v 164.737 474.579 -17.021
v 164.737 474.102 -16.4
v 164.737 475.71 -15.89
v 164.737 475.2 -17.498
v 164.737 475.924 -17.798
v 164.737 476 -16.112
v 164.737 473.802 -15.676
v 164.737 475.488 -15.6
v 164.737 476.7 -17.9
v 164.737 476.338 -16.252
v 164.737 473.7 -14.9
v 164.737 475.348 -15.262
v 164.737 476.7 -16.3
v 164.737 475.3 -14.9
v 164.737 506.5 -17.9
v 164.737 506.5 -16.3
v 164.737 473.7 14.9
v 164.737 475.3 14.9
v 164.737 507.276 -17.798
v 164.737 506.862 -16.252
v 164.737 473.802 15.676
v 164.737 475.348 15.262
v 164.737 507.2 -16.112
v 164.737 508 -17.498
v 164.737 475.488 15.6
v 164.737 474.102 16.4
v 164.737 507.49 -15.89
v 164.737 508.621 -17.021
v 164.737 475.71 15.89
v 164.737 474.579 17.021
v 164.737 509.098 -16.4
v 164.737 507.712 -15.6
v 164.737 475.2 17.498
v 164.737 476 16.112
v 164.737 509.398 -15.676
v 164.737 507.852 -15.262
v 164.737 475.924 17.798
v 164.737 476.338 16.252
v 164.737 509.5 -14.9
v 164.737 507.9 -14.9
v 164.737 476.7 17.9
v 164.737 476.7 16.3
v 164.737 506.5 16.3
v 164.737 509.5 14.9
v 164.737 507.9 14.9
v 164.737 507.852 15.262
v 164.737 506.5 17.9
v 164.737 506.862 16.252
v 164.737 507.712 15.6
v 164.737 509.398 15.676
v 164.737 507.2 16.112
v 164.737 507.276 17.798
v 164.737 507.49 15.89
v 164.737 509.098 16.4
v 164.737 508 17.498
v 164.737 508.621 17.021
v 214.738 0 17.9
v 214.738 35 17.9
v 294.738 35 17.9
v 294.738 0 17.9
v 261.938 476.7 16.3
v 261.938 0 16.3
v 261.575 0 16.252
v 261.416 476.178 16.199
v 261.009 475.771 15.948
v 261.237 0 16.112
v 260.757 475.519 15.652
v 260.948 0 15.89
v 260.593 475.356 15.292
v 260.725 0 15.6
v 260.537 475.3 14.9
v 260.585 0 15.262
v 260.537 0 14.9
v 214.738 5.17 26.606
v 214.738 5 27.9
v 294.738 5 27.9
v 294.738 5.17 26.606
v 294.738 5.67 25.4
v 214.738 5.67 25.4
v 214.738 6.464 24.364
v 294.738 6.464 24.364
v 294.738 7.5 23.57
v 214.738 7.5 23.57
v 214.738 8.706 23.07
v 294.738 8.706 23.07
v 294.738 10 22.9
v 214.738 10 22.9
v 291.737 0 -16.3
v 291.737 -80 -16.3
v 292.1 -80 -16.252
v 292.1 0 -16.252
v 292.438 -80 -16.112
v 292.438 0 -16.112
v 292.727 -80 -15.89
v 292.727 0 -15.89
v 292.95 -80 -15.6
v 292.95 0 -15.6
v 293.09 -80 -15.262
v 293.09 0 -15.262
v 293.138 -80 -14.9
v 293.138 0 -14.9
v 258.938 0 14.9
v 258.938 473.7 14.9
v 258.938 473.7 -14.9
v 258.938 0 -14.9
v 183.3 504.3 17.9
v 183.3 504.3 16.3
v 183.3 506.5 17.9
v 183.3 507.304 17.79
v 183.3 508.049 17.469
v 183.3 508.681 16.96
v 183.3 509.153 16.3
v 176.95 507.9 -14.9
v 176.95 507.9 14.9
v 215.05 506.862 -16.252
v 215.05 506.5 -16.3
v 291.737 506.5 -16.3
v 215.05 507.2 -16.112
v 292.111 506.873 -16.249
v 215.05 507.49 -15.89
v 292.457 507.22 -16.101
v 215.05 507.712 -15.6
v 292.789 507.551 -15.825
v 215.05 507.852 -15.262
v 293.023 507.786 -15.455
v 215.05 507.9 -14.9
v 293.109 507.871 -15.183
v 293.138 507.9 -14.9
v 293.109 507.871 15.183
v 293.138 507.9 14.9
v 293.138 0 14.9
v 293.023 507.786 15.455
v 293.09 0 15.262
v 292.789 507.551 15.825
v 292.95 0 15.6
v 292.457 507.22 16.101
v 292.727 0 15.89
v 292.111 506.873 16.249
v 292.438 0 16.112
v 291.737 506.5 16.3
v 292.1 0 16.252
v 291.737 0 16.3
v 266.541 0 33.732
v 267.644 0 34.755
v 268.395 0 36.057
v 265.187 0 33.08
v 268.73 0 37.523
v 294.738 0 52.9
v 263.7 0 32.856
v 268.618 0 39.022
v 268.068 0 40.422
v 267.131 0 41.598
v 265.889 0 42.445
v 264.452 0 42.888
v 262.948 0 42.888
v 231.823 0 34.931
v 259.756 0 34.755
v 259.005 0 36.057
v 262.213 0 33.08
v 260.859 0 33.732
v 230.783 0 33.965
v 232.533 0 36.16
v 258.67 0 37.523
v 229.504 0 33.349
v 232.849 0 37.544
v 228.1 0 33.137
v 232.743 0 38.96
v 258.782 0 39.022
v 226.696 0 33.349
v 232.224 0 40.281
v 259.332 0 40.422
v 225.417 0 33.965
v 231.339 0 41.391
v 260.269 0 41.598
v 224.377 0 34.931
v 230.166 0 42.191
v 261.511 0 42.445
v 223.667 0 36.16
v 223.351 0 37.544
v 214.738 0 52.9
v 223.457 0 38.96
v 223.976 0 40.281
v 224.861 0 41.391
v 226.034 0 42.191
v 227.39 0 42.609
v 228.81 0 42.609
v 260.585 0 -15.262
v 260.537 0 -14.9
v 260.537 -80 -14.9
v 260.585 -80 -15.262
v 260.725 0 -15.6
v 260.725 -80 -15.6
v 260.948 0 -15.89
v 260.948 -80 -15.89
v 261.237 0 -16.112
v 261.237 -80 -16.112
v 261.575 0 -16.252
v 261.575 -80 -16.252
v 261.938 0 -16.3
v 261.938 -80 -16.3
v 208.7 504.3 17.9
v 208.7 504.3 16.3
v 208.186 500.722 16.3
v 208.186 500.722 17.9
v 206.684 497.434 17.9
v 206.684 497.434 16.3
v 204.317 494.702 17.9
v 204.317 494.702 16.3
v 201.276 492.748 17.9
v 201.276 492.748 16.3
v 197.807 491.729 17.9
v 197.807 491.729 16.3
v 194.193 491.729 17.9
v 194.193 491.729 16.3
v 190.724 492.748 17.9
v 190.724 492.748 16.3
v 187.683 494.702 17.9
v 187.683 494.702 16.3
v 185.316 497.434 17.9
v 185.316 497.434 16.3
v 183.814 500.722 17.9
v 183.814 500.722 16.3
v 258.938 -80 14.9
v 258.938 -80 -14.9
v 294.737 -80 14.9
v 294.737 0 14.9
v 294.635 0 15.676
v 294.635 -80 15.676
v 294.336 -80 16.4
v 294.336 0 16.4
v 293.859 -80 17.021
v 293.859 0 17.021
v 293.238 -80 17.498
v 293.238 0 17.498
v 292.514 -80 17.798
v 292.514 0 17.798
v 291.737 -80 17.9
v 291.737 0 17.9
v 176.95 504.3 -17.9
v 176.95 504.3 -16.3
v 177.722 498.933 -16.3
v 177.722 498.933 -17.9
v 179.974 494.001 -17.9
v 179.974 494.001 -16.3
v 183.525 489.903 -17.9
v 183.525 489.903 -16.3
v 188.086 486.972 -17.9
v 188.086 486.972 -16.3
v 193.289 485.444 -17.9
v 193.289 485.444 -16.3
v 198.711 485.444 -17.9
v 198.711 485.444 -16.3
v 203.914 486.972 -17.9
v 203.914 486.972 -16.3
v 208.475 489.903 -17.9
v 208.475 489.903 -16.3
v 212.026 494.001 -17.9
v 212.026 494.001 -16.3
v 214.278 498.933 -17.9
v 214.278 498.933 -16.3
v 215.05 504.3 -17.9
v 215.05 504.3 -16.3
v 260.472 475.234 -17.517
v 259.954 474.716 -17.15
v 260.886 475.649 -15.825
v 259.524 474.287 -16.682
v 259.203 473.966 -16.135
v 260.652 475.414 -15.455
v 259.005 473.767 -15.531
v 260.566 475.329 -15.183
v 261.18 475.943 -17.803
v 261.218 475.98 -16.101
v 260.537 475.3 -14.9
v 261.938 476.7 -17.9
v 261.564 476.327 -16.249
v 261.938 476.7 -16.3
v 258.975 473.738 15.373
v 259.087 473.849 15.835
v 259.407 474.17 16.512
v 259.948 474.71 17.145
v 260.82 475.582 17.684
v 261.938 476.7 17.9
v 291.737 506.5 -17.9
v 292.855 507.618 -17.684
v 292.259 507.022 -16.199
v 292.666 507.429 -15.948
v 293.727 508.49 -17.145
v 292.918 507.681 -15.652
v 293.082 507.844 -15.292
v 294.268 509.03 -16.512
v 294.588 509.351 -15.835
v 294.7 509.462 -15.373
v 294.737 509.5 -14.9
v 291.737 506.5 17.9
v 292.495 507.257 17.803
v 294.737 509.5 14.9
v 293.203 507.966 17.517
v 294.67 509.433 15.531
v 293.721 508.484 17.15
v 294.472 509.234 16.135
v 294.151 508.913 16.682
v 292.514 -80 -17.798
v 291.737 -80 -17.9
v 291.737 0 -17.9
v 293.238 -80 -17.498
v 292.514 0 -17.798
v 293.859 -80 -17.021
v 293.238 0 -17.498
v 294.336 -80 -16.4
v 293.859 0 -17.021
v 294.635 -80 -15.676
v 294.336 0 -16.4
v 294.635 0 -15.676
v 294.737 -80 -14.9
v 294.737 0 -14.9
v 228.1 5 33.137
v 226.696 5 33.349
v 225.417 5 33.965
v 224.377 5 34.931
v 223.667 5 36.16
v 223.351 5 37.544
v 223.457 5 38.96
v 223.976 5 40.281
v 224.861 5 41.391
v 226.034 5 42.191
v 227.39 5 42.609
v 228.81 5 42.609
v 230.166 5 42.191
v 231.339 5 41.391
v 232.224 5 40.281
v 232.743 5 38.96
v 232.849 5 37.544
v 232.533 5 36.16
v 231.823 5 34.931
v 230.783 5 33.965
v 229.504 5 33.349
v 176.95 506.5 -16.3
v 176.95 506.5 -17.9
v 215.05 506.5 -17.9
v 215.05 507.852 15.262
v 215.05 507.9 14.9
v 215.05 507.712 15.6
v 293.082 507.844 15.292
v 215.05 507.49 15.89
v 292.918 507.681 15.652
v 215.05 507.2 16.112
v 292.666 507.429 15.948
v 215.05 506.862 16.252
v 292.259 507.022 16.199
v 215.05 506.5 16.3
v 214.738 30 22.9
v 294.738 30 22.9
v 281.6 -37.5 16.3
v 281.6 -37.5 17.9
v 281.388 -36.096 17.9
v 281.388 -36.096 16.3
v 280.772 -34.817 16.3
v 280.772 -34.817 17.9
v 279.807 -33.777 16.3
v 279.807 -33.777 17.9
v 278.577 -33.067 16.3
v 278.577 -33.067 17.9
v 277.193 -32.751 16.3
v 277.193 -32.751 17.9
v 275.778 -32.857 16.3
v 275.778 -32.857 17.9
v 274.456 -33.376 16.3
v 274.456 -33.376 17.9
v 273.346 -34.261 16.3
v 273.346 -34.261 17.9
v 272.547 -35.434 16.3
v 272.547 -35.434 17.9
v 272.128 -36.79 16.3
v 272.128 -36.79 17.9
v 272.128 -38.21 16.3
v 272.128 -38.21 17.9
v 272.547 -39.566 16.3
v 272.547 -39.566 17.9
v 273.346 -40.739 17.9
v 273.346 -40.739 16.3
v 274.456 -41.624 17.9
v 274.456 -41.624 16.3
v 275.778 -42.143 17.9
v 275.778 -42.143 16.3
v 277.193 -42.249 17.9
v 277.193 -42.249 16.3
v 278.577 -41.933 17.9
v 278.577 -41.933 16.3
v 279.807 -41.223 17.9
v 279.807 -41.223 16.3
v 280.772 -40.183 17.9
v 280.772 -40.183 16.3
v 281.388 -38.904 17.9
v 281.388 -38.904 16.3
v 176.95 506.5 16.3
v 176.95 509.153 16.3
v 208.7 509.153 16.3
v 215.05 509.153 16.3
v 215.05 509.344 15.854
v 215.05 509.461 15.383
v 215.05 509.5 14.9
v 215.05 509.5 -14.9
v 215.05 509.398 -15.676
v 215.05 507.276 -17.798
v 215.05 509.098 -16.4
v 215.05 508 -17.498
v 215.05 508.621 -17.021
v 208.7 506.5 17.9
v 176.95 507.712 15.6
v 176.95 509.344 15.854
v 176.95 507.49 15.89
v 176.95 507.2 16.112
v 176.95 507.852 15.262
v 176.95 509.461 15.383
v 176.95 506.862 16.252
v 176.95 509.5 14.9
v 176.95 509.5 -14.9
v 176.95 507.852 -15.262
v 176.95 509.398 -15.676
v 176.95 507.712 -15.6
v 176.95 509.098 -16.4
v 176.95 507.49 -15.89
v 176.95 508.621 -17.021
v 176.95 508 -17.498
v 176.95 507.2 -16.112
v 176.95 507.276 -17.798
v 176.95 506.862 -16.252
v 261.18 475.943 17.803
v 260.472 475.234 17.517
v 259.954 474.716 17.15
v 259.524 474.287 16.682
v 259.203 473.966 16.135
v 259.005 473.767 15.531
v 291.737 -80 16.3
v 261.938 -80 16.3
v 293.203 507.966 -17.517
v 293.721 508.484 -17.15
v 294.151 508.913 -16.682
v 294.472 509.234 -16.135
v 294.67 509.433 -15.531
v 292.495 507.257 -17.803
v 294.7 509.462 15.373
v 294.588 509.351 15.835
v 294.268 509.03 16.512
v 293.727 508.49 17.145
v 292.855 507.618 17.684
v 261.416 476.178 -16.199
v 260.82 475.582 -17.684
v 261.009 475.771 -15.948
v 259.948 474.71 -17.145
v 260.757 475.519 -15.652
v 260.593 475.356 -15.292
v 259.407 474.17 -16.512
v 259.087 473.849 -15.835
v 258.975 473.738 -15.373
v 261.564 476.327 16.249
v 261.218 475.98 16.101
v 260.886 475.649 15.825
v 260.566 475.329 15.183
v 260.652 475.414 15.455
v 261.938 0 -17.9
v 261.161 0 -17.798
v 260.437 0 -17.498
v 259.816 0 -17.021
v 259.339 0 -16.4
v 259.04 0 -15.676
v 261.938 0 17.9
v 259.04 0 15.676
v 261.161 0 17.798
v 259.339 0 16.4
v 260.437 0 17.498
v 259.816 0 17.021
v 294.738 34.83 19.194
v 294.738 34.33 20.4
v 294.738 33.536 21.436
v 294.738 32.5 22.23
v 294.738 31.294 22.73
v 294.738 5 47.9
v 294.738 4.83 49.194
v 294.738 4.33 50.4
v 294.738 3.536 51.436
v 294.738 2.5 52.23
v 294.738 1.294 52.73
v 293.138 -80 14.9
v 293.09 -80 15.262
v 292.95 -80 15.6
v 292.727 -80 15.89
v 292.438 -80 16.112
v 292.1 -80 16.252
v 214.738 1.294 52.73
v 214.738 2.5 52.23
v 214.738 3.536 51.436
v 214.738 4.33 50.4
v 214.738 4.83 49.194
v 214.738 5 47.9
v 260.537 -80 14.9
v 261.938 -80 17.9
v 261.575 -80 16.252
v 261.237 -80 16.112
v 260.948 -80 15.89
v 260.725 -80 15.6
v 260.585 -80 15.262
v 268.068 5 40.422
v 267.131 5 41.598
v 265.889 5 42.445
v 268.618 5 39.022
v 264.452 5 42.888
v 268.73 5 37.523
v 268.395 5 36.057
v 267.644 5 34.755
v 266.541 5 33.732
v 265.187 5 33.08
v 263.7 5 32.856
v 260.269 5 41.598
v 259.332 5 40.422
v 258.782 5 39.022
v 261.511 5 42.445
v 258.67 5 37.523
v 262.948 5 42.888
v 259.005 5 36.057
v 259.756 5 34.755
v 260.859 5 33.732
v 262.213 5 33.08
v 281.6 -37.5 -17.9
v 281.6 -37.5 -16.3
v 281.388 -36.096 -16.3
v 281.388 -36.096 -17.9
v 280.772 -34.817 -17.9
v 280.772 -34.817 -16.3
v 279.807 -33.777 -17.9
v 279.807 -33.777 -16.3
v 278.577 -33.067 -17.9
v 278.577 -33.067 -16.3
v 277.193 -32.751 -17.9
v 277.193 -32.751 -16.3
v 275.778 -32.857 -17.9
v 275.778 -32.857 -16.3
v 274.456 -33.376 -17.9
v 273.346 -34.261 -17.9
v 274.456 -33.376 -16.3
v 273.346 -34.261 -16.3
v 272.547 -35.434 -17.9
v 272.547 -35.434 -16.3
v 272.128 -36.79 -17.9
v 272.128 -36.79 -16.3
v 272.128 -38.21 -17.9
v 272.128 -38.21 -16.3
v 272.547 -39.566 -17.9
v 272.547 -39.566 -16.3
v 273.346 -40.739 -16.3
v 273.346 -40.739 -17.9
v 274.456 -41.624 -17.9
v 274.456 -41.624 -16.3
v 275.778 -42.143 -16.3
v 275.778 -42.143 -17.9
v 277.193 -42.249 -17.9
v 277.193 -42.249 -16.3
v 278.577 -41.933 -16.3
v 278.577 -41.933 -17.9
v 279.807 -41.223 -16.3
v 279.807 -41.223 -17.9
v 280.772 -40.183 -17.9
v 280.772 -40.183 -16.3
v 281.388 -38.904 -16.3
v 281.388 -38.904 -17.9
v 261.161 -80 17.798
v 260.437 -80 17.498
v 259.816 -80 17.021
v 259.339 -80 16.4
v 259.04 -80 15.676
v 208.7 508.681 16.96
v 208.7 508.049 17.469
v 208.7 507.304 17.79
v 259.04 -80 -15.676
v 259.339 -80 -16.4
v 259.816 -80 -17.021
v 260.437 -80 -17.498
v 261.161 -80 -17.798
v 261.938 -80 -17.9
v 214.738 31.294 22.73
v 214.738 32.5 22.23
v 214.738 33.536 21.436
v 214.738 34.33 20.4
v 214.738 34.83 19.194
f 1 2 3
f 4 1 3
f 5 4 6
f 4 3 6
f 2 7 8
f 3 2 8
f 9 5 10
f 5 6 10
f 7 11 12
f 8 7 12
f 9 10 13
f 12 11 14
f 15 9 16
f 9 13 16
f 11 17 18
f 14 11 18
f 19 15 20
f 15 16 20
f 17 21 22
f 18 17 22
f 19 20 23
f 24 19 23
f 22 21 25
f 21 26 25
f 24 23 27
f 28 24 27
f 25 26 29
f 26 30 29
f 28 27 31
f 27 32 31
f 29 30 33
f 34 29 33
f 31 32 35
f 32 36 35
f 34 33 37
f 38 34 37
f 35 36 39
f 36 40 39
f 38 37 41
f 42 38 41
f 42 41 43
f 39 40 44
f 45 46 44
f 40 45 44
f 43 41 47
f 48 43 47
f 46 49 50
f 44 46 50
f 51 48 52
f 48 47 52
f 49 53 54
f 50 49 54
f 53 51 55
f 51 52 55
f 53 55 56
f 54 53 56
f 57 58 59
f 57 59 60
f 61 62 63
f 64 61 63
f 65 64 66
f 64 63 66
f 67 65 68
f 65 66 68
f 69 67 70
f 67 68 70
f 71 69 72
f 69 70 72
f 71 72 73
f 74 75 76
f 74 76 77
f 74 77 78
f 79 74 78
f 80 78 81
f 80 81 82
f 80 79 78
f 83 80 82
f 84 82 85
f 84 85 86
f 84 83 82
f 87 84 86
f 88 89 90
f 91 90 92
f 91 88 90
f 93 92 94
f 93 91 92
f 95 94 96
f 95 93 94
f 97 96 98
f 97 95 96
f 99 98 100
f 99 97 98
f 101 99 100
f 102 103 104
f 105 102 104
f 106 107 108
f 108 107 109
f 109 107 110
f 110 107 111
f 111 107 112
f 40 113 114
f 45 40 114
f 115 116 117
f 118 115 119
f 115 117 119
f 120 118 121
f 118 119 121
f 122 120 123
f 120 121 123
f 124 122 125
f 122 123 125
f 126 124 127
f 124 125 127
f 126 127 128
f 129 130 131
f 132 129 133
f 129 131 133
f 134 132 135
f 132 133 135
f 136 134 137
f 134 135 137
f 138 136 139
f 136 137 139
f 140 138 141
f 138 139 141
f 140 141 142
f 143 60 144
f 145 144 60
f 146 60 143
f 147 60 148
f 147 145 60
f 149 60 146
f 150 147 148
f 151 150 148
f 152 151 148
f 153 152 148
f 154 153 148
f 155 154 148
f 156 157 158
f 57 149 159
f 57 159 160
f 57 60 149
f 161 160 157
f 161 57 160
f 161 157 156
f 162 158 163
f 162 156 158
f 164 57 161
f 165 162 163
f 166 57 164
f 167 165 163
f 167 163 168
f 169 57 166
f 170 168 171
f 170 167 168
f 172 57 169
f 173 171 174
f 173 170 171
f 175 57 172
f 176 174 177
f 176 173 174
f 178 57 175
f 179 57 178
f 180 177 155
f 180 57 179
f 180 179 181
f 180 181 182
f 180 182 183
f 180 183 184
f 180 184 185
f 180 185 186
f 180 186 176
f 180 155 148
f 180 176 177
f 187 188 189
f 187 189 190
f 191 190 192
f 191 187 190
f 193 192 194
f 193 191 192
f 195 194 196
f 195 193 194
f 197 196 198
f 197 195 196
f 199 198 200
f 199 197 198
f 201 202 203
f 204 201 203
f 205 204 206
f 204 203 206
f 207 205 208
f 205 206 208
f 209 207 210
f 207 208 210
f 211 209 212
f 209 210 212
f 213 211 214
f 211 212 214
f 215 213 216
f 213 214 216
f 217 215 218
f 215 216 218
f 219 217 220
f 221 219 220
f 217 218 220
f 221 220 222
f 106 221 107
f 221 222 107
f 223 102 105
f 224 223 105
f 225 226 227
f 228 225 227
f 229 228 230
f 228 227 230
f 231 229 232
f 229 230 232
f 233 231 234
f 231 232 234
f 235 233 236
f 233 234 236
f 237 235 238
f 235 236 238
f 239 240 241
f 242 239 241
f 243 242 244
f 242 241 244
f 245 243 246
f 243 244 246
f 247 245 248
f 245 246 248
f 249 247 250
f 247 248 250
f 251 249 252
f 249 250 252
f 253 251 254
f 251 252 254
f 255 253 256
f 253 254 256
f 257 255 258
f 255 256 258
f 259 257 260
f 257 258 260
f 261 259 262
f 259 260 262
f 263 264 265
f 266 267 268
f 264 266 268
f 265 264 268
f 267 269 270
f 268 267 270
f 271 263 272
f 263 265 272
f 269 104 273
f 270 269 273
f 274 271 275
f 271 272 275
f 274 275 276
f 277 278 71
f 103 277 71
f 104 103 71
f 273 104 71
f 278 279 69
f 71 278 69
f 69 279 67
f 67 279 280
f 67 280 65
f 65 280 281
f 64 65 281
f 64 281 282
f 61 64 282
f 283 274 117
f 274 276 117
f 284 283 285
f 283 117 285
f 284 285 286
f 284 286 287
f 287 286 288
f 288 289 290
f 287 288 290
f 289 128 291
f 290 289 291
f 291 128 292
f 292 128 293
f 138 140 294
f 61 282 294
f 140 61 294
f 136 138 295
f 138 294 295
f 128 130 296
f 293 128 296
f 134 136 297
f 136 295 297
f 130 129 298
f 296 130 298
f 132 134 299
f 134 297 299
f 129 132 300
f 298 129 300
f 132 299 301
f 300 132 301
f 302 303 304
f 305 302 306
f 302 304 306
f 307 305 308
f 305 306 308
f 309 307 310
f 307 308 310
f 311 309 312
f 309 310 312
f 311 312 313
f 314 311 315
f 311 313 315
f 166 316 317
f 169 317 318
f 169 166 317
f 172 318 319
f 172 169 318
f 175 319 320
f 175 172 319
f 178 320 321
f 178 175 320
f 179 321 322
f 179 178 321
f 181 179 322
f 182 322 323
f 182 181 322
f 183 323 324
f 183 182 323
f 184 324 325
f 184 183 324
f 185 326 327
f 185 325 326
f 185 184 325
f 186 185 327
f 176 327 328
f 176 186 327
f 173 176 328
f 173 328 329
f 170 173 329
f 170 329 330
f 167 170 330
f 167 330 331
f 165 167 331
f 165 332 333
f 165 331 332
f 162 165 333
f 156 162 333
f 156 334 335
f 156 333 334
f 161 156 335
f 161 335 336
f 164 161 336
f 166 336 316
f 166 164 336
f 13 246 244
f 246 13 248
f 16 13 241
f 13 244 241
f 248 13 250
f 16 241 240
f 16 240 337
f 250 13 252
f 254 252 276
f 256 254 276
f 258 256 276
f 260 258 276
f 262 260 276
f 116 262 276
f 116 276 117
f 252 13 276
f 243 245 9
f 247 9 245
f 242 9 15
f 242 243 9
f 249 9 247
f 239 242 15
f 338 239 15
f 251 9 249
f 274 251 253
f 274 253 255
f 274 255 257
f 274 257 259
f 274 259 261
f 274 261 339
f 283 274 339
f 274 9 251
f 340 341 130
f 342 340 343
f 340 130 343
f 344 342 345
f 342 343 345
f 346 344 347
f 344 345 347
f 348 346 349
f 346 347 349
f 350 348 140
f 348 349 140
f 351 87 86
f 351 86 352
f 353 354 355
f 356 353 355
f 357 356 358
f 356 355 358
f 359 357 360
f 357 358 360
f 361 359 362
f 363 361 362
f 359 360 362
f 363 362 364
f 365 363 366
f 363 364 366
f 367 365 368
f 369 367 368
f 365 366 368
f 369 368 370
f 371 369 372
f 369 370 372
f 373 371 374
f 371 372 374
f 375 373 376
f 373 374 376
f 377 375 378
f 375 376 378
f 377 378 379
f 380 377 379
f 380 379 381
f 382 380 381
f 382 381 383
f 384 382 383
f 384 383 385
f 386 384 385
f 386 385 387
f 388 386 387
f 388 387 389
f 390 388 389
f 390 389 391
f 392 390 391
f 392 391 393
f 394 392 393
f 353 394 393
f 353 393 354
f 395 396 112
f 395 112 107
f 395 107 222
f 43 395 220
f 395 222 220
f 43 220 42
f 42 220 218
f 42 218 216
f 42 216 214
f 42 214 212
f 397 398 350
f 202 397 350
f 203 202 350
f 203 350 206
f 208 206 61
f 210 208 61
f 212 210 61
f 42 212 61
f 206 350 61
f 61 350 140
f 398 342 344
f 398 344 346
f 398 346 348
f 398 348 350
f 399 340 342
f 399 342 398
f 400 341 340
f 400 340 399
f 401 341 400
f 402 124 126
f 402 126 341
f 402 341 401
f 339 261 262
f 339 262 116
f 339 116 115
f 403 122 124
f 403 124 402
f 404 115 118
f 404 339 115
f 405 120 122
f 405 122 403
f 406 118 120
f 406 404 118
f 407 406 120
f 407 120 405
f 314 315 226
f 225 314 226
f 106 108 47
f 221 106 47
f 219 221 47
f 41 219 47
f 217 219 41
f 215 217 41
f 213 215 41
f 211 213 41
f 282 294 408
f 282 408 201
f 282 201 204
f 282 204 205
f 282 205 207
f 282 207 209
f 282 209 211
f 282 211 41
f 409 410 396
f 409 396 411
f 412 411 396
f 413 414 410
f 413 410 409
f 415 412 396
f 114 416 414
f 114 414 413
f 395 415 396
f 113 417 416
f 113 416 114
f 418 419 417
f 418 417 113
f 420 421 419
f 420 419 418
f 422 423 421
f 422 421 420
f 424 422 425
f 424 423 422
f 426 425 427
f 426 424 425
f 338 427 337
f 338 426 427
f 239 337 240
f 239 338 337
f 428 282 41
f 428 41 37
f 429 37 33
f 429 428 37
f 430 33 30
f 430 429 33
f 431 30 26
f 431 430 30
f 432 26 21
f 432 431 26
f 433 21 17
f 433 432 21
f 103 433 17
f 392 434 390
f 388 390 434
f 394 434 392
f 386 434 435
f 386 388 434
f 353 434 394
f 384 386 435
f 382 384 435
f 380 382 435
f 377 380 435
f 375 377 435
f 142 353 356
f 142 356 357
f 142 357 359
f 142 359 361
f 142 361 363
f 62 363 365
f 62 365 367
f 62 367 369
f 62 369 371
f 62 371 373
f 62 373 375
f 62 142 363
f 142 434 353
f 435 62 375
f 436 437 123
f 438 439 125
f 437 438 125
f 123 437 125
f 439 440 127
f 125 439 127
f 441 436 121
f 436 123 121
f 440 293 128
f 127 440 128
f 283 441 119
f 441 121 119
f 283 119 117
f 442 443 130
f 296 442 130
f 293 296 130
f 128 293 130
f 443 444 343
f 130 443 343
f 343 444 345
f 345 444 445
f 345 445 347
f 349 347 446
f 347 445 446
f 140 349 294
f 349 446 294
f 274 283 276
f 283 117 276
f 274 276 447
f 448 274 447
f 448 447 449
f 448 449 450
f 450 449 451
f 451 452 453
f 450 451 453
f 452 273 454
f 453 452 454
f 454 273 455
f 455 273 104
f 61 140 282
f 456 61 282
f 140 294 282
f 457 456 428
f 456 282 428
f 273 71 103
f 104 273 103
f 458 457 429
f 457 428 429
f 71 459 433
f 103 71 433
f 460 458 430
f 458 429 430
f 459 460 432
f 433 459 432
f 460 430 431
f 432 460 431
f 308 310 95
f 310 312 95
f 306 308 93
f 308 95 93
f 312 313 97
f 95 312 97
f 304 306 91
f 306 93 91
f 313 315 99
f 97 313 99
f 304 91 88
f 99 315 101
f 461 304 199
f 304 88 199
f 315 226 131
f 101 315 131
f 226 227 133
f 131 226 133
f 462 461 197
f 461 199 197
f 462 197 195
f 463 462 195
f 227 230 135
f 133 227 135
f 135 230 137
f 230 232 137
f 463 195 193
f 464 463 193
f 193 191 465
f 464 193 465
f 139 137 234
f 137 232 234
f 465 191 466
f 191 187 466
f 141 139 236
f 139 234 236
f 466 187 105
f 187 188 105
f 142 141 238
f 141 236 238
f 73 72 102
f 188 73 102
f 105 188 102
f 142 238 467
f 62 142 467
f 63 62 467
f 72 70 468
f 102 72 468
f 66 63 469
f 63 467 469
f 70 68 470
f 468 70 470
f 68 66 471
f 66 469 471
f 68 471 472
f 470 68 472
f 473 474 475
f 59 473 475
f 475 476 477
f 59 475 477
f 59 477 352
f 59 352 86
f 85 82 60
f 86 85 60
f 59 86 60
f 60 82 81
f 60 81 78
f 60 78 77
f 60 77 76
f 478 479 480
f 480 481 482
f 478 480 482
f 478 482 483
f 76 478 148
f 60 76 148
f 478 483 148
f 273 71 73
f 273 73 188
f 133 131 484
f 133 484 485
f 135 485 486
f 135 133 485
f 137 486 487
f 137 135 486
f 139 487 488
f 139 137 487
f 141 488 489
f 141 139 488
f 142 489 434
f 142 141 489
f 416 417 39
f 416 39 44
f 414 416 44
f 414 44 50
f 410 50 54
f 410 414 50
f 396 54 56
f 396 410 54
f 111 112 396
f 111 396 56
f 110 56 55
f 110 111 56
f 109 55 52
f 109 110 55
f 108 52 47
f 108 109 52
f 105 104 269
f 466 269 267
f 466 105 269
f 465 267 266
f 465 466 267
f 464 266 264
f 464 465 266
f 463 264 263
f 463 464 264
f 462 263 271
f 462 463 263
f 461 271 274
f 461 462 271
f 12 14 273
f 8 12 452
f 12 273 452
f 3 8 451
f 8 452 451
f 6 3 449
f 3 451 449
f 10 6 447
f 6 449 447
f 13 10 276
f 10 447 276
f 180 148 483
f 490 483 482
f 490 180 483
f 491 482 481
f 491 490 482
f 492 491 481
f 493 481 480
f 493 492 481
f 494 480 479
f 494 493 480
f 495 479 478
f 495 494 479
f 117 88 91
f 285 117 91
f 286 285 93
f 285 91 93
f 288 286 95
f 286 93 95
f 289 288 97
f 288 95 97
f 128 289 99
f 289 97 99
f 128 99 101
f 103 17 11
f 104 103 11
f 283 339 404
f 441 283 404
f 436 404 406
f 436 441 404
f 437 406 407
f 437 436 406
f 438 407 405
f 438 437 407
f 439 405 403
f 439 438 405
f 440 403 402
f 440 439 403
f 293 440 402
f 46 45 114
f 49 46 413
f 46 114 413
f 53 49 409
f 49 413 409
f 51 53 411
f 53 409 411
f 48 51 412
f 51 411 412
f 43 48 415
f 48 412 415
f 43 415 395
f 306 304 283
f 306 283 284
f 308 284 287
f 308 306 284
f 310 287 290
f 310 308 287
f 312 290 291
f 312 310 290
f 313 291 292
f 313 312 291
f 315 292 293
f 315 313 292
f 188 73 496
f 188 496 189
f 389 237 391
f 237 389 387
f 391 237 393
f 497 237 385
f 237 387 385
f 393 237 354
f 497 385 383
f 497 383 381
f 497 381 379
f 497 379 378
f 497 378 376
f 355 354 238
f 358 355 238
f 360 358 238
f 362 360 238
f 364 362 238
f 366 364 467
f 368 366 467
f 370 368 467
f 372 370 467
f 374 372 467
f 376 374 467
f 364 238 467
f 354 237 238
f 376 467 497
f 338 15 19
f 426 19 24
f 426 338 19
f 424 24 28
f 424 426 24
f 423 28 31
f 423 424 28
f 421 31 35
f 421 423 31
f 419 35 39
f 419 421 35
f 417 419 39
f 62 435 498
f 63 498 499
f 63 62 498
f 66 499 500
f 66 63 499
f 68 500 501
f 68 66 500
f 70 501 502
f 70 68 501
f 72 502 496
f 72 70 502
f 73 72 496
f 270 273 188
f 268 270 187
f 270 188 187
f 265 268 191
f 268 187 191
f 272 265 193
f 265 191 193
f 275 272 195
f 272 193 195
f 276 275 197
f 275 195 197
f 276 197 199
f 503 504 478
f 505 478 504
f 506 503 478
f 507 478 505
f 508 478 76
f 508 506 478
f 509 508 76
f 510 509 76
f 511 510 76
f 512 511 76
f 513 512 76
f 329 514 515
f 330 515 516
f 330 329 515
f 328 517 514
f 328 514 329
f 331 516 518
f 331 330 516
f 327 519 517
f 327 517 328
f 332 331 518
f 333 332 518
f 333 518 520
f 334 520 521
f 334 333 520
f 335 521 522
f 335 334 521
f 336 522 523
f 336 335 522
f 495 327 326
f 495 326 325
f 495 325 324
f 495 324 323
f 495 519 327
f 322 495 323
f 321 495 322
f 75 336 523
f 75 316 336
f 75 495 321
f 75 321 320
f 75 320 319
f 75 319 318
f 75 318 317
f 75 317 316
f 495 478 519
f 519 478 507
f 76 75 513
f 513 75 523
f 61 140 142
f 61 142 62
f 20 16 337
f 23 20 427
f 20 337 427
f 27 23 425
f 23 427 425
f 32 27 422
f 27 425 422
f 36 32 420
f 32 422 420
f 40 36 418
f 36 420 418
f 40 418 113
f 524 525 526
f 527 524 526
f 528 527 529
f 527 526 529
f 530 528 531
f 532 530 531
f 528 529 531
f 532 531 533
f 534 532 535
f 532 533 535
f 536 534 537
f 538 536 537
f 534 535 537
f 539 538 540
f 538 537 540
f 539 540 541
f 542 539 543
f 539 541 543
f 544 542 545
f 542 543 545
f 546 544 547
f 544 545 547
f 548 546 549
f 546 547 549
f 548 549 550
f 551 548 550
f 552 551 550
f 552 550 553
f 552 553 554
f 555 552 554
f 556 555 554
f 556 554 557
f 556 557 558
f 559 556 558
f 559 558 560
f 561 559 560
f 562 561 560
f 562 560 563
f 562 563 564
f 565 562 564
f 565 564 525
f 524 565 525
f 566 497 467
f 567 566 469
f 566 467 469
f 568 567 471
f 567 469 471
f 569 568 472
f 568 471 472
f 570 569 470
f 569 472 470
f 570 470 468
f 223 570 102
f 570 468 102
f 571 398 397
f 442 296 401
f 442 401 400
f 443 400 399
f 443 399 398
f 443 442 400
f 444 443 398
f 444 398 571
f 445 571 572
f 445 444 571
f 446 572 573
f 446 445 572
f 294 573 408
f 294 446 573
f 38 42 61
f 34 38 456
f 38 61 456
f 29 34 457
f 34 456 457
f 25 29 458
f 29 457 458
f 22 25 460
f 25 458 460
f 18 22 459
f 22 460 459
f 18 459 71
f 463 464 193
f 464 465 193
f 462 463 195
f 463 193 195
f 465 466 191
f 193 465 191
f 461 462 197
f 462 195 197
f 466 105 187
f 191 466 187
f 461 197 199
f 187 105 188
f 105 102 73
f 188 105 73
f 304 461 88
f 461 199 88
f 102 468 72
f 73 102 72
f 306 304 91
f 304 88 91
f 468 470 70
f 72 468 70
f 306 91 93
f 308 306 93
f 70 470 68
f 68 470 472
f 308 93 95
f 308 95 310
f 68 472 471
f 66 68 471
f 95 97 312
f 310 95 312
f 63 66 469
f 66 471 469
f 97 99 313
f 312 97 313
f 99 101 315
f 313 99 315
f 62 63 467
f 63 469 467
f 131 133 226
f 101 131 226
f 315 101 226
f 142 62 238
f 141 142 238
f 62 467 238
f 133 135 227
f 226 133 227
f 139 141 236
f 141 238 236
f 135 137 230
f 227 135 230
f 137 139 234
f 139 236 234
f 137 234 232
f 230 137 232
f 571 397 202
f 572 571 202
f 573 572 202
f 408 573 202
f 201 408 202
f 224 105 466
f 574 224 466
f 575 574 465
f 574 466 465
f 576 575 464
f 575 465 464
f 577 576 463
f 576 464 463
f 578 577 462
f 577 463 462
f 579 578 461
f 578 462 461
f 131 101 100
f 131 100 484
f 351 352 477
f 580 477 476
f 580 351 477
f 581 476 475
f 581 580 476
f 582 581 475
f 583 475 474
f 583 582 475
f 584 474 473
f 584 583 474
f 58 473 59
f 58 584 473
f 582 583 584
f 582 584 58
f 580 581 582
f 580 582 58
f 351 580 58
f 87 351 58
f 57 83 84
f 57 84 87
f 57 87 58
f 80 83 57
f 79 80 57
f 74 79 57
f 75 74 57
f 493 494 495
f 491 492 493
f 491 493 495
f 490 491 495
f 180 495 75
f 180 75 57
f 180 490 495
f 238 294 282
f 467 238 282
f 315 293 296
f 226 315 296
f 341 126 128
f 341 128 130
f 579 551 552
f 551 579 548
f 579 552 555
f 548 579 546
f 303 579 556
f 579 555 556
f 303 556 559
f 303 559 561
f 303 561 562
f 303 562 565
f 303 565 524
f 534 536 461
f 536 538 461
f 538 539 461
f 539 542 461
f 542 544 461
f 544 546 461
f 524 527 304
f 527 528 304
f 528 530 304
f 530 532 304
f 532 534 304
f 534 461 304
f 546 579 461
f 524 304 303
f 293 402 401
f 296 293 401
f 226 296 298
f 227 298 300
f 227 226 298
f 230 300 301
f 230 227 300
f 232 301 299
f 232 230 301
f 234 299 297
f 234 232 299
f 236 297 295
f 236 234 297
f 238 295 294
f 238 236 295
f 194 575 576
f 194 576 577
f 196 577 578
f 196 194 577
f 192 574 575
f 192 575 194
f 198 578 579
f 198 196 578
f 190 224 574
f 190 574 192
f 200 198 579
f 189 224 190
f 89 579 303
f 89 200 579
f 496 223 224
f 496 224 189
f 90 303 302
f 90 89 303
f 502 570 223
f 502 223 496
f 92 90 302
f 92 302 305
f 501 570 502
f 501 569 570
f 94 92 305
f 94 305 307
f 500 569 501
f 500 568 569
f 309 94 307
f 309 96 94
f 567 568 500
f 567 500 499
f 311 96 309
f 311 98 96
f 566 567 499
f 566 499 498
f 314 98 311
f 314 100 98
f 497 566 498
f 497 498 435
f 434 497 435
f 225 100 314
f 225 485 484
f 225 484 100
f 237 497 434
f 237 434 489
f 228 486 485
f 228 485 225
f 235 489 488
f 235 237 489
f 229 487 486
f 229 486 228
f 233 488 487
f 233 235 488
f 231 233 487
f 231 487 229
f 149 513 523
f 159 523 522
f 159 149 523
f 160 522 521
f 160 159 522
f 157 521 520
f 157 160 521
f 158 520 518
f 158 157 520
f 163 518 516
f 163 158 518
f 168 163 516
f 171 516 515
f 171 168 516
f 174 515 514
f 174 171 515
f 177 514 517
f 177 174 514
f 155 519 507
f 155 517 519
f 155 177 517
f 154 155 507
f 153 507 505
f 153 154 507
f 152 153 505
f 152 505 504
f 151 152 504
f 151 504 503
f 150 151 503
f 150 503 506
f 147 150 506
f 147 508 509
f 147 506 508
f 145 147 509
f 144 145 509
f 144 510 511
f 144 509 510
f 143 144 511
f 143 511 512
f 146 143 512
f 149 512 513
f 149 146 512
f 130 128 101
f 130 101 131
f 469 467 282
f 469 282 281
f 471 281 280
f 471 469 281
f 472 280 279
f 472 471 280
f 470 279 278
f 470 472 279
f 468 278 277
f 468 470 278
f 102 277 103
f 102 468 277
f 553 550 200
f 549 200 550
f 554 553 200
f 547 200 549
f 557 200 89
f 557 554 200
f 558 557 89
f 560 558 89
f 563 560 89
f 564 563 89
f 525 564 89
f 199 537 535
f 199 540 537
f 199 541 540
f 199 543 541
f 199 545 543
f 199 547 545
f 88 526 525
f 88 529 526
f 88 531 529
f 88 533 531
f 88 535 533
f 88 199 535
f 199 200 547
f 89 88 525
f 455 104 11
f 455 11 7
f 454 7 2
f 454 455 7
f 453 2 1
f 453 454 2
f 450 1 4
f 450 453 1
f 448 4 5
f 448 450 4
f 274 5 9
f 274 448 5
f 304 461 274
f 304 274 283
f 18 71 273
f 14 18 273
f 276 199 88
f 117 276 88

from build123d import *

# Parameters (mm, degrees)
STRUCTURAL_MEMBERMAIN_DEPTH                   = 1
STRUCTURAL_MEMBERMAIN_DEPTH_BACK              = 80
STRUCTURAL_MEMBERMAIN_2_DEPTH                 = 518.914422766
STRUCTURAL_MEMBERMAIN_3_DEPTH                 = 138.414422766
CUT_EXTRUDETOPRAILGUIDE_DEPTH                 = 589.881018463
CUT_EXTRUDETOPRAILGUIDE_DEPTH_BACK            = 589.881018463
STRUCTURAL_MEMBERANGLE_DEPTH                  = 80
SKETCH15_R                                    = 4.7625
SKETCH15_R_2                                  = 5.044092484
CUT_EXTRUDEMOUNTINGHOLES_DEPTH                = 591.981263583
CUT_EXTRUDEENLARGERAILGUIDE_DEPTH             = 591.981263583
CUT_EXTRUDEENLARGERAILGUIDE_DIRECTION_2_REACH = 592.981
SKETCH17_R                                    = 4.7625
CUT_EXTRUDE1_DEPTH                            = 590.696603268


with BuildPart() as part:
    # Sketch11 → Structural MemberMain (new, two sides)
    with BuildSketch(Plane(origin=(276.8375, 0, 0), x_dir=(-1, 0, 0), z_dir=(0, 1, 0))) as structural_membermain_sk:
        with BuildLine():
            Line((-14.9, 17.9), (14.9, 17.9))
            ThreePointArc((14.9, 17.9), (17.021320344, 17.021320344), (17.9, 14.9))
            Line((17.9, 14.9), (17.9, -14.9))
            ThreePointArc((17.9, -14.9), (17.021320344, -17.021320344), (14.9, -17.9))
            Line((14.9, -17.9), (-14.9, -17.9))
            ThreePointArc((-14.9, -17.9), (-17.021320344, -17.021320344), (-17.9, -14.9))
            Line((-17.9, -14.9), (-17.9, 14.9))
            ThreePointArc((-17.9, 14.9), (-17.021320344, 17.021320344), (-14.9, 17.9))
        make_face()
        with BuildLine():
            Line((-14.9, 16.3), (14.9, 16.3))
            ThreePointArc((14.9, 16.3), (15.889949494, 15.889949494), (16.3, 14.9))
            Line((16.3, 14.9), (16.3, -14.9))
            ThreePointArc((16.3, -14.9), (15.889949494, -15.889949494), (14.9, -16.3))
            Line((14.9, -16.3), (-14.9, -16.3))
            ThreePointArc((-14.9, -16.3), (-15.889949494, -15.889949494), (-16.3, -14.9))
            Line((-16.3, -14.9), (-16.3, 14.9))
            ThreePointArc((-16.3, 14.9), (-15.889949494, 15.889949494), (-14.9, 16.3))
        make_face(mode=Mode.SUBTRACT)
    extrude(amount=STRUCTURAL_MEMBERMAIN_DEPTH)
    extrude(structural_membermain_sk.sketch, amount=-STRUCTURAL_MEMBERMAIN_DEPTH_BACK)

    # Structural MemberMain mitre 1
    split(bisect_by=Plane(origin=(276.8375, 0, 0), x_dir=(1, 0, 0), z_dir=(0, -1, 0)), keep=Keep.TOP)

    # Sketch17 → Cut-Extrude1 (cut, through all)
    with BuildSketch(Plane.XY.offset(17.9)):
        with Locations((276.8375, -37.5)):
            Circle(SKETCH17_R)
    extrude(amount=-CUT_EXTRUDE1_DEPTH, mode=Mode.SUBTRACT)


with BuildPart() as body_2:
    # Sketch11 on segment 2 (carried to segment 2) → Structural MemberMain 2 (new body)
    with BuildSketch(Plane(origin=(276.8375, -1, 0), x_dir=(-1, 0, 0), z_dir=(0, 1, 0))):
        with BuildLine():
            Line((-14.9, 17.9), (14.9, 17.9))
            ThreePointArc((14.9, 17.9), (17.021320344, 17.021320344), (17.9, 14.9))
            Line((17.9, 14.9), (17.9, -14.9))
            ThreePointArc((17.9, -14.9), (17.021320344, -17.021320344), (14.9, -17.9))
            Line((14.9, -17.9), (-14.9, -17.9))
            ThreePointArc((-14.9, -17.9), (-17.021320344, -17.021320344), (-17.9, -14.9))
            Line((-17.9, -14.9), (-17.9, 14.9))
            ThreePointArc((-17.9, 14.9), (-17.021320344, 17.021320344), (-14.9, 17.9))
        make_face()
        with BuildLine():
            Line((-14.9, 16.3), (14.9, 16.3))
            ThreePointArc((14.9, 16.3), (15.889949494, 15.889949494), (16.3, 14.9))
            Line((16.3, 14.9), (16.3, -14.9))
            ThreePointArc((16.3, -14.9), (15.889949494, -15.889949494), (14.9, -16.3))
            Line((14.9, -16.3), (-14.9, -16.3))
            ThreePointArc((-14.9, -16.3), (-15.889949494, -15.889949494), (-16.3, -14.9))
            Line((-16.3, -14.9), (-16.3, 14.9))
            ThreePointArc((-16.3, 14.9), (-15.889949494, 15.889949494), (-14.9, 16.3))
        make_face(mode=Mode.SUBTRACT)
    extrude(amount=STRUCTURAL_MEMBERMAIN_2_DEPTH)

    # Structural MemberMain 2 mitre 1
    split(bisect_by=Plane(origin=(276.8375, 0, 0), x_dir=(-1, 0, 0), z_dir=(0, 1, 0)), keep=Keep.TOP)

    # Structural MemberMain 2 mitre 2
    split(bisect_by=Plane(origin=(276.8375, 491.6, 0), x_dir=(0.707106781, 0.707106781, 0), z_dir=(0.707106781, -0.707106781, 0)), keep=Keep.TOP)


with BuildPart() as body_3:
    # Sketch11 on segment 3 (carried to segment 3) → Structural MemberMain 3 (new body)
    with BuildSketch(Plane(origin=(303.151922766, 491.6, 0), x_dir=(0, -1, 0), z_dir=(-1, 0, 0))):
        with BuildLine():
            Line((-14.9, 17.9), (14.9, 17.9))
            ThreePointArc((14.9, 17.9), (17.021320344, 17.021320344), (17.9, 14.9))
            Line((17.9, 14.9), (17.9, -14.9))
            ThreePointArc((17.9, -14.9), (17.021320344, -17.021320344), (14.9, -17.9))
            Line((14.9, -17.9), (-14.9, -17.9))
            ThreePointArc((-14.9, -17.9), (-17.021320344, -17.021320344), (-17.9, -14.9))
            Line((-17.9, -14.9), (-17.9, 14.9))
            ThreePointArc((-17.9, 14.9), (-17.021320344, 17.021320344), (-14.9, 17.9))
        make_face()
        with BuildLine():
            Line((-14.9, 16.3), (14.9, 16.3))
            ThreePointArc((14.9, 16.3), (15.889949494, 15.889949494), (16.3, 14.9))
            Line((16.3, 14.9), (16.3, -14.9))
            ThreePointArc((16.3, -14.9), (15.889949494, -15.889949494), (14.9, -16.3))
            Line((14.9, -16.3), (-14.9, -16.3))
            ThreePointArc((-14.9, -16.3), (-15.889949494, -15.889949494), (-16.3, -14.9))
            Line((-16.3, -14.9), (-16.3, 14.9))
            ThreePointArc((-16.3, 14.9), (-15.889949494, 15.889949494), (-14.9, 16.3))
        make_face(mode=Mode.SUBTRACT)
    extrude(amount=STRUCTURAL_MEMBERMAIN_3_DEPTH)

    # Structural MemberMain 3 mitre 1
    split(bisect_by=Plane(origin=(276.8375, 491.6, 0), x_dir=(-0.707106781, -0.707106781, 0), z_dir=(-0.707106781, 0.707106781, 0)), keep=Keep.TOP)

    # Sketch12 → Cut-ExtrudeTopRailGuide (cut, two sides)
    with BuildSketch(Plane.XY) as cut_extrudetoprailguide_sk:
        with BuildLine():
            Line((183.3, 504.3), (183.3, 514.7))
            ThreePointArc((183.3, 514.7), (196, 527.4), (208.7, 514.7))
            Line((208.7, 514.7), (208.7, 504.3))
            ThreePointArc((208.7, 504.3), (196, 491.6), (183.3, 504.3))
        make_face()
    extrude(amount=CUT_EXTRUDETOPRAILGUIDE_DEPTH, mode=Mode.SUBTRACT)
    extrude(cut_extrudetoprailguide_sk.sketch, amount=-CUT_EXTRUDETOPRAILGUIDE_DEPTH_BACK, mode=Mode.SUBTRACT)

    # Sketch16 → Cut-ExtrudeEnlargeRailGuide (cut)
    with BuildSketch(Plane.XY):
        with BuildLine():
            Line((215.05, 504.3), (215.05, 514.7))
            ThreePointArc((215.05, 514.7), (196, 533.75), (176.95, 514.7))
            Line((176.95, 514.7), (176.95, 504.3))
            ThreePointArc((176.95, 504.3), (196, 485.25), (215.05, 504.3))
        make_face()
    extrude(amount=-CUT_EXTRUDEENLARGERAILGUIDE_DEPTH, mode=Mode.SUBTRACT)

    # Cut-ExtrudeEnlargeRailGuide direction 2: up to this face of the body (flat: up to its plane)
    cut_extrudeenlargerailguide_direction_2_end = Plane(body_3.part.faces().sort_by_distance((223.67987198, 491.462157452, 16.3))[0])
    # Sketch16 → Cut-ExtrudeEnlargeRailGuide direction 2 (cut, up to the picked face)
    with BuildSketch(Plane.XY, mode=Mode.PRIVATE) as cut_extrudeenlargerailguide_direction_2_sk1:
        with BuildLine():
            Line((215.05, 504.3), (215.05, 514.7))
            ThreePointArc((215.05, 514.7), (196, 533.75), (176.95, 514.7))
            Line((176.95, 514.7), (176.95, 504.3))
            ThreePointArc((176.95, 504.3), (196, 485.25), (215.05, 504.3))
        make_face()
    cut_extrudeenlargerailguide_direction_2_tool1 = split(extrude(cut_extrudeenlargerailguide_direction_2_sk1.sketch, amount=CUT_EXTRUDEENLARGERAILGUIDE_DIRECTION_2_REACH, mode=Mode.PRIVATE), bisect_by=cut_extrudeenlargerailguide_direction_2_end, keep=Keep.BOTH, mode=Mode.PRIVATE)
    add(cut_extrudeenlargerailguide_direction_2_tool1.solids().sort_by(Axis((196, 509.5, 0), (0, 0, 1)))[0], mode=Mode.SUBTRACT)


with BuildPart() as body_4:
    # Sketch14 → Structural MemberAngle (new body)
    with BuildSketch(Plane(origin=(214.7375, 0, 17.9), x_dir=(0, 1, 0), z_dir=(1, 0, 0))):
        with BuildLine():
            Line((0, 0), (0, 35))
            ThreePointArc((0, 35), (3.535533906, 33.535533906), (5, 30))
            Line((5, 30), (5, 10))
            ThreePointArc((5, 10), (6.464466094, 6.464466094), (10, 5))
            Line((10, 5), (30, 5))
            ThreePointArc((30, 5), (33.535533906, 3.535533906), (35, 0))
            Line((35, 0), (0, 0))
        make_face()
    extrude(amount=STRUCTURAL_MEMBERANGLE_DEPTH)

    # Sketch15 → Cut-ExtrudeMountingHoles (cut, through all)
    with BuildSketch(Plane(origin=(0, 0, 0), x_dir=(1, 0, 0), z_dir=(0, 1, 0))):
        with Locations(Location((228.1, -37.9, 0), (0, 0, 90))):
            Circle(SKETCH15_R)
        with Locations(Location((263.7, -37.9, 0), (0, 0, 90))):
            Circle(SKETCH15_R_2)
    extrude(amount=CUT_EXTRUDEMOUNTINGHOLES_DEPTH, mode=Mode.SUBTRACT)


solid = Compound([part.part, body_2.part, body_3.part, body_4.part])
